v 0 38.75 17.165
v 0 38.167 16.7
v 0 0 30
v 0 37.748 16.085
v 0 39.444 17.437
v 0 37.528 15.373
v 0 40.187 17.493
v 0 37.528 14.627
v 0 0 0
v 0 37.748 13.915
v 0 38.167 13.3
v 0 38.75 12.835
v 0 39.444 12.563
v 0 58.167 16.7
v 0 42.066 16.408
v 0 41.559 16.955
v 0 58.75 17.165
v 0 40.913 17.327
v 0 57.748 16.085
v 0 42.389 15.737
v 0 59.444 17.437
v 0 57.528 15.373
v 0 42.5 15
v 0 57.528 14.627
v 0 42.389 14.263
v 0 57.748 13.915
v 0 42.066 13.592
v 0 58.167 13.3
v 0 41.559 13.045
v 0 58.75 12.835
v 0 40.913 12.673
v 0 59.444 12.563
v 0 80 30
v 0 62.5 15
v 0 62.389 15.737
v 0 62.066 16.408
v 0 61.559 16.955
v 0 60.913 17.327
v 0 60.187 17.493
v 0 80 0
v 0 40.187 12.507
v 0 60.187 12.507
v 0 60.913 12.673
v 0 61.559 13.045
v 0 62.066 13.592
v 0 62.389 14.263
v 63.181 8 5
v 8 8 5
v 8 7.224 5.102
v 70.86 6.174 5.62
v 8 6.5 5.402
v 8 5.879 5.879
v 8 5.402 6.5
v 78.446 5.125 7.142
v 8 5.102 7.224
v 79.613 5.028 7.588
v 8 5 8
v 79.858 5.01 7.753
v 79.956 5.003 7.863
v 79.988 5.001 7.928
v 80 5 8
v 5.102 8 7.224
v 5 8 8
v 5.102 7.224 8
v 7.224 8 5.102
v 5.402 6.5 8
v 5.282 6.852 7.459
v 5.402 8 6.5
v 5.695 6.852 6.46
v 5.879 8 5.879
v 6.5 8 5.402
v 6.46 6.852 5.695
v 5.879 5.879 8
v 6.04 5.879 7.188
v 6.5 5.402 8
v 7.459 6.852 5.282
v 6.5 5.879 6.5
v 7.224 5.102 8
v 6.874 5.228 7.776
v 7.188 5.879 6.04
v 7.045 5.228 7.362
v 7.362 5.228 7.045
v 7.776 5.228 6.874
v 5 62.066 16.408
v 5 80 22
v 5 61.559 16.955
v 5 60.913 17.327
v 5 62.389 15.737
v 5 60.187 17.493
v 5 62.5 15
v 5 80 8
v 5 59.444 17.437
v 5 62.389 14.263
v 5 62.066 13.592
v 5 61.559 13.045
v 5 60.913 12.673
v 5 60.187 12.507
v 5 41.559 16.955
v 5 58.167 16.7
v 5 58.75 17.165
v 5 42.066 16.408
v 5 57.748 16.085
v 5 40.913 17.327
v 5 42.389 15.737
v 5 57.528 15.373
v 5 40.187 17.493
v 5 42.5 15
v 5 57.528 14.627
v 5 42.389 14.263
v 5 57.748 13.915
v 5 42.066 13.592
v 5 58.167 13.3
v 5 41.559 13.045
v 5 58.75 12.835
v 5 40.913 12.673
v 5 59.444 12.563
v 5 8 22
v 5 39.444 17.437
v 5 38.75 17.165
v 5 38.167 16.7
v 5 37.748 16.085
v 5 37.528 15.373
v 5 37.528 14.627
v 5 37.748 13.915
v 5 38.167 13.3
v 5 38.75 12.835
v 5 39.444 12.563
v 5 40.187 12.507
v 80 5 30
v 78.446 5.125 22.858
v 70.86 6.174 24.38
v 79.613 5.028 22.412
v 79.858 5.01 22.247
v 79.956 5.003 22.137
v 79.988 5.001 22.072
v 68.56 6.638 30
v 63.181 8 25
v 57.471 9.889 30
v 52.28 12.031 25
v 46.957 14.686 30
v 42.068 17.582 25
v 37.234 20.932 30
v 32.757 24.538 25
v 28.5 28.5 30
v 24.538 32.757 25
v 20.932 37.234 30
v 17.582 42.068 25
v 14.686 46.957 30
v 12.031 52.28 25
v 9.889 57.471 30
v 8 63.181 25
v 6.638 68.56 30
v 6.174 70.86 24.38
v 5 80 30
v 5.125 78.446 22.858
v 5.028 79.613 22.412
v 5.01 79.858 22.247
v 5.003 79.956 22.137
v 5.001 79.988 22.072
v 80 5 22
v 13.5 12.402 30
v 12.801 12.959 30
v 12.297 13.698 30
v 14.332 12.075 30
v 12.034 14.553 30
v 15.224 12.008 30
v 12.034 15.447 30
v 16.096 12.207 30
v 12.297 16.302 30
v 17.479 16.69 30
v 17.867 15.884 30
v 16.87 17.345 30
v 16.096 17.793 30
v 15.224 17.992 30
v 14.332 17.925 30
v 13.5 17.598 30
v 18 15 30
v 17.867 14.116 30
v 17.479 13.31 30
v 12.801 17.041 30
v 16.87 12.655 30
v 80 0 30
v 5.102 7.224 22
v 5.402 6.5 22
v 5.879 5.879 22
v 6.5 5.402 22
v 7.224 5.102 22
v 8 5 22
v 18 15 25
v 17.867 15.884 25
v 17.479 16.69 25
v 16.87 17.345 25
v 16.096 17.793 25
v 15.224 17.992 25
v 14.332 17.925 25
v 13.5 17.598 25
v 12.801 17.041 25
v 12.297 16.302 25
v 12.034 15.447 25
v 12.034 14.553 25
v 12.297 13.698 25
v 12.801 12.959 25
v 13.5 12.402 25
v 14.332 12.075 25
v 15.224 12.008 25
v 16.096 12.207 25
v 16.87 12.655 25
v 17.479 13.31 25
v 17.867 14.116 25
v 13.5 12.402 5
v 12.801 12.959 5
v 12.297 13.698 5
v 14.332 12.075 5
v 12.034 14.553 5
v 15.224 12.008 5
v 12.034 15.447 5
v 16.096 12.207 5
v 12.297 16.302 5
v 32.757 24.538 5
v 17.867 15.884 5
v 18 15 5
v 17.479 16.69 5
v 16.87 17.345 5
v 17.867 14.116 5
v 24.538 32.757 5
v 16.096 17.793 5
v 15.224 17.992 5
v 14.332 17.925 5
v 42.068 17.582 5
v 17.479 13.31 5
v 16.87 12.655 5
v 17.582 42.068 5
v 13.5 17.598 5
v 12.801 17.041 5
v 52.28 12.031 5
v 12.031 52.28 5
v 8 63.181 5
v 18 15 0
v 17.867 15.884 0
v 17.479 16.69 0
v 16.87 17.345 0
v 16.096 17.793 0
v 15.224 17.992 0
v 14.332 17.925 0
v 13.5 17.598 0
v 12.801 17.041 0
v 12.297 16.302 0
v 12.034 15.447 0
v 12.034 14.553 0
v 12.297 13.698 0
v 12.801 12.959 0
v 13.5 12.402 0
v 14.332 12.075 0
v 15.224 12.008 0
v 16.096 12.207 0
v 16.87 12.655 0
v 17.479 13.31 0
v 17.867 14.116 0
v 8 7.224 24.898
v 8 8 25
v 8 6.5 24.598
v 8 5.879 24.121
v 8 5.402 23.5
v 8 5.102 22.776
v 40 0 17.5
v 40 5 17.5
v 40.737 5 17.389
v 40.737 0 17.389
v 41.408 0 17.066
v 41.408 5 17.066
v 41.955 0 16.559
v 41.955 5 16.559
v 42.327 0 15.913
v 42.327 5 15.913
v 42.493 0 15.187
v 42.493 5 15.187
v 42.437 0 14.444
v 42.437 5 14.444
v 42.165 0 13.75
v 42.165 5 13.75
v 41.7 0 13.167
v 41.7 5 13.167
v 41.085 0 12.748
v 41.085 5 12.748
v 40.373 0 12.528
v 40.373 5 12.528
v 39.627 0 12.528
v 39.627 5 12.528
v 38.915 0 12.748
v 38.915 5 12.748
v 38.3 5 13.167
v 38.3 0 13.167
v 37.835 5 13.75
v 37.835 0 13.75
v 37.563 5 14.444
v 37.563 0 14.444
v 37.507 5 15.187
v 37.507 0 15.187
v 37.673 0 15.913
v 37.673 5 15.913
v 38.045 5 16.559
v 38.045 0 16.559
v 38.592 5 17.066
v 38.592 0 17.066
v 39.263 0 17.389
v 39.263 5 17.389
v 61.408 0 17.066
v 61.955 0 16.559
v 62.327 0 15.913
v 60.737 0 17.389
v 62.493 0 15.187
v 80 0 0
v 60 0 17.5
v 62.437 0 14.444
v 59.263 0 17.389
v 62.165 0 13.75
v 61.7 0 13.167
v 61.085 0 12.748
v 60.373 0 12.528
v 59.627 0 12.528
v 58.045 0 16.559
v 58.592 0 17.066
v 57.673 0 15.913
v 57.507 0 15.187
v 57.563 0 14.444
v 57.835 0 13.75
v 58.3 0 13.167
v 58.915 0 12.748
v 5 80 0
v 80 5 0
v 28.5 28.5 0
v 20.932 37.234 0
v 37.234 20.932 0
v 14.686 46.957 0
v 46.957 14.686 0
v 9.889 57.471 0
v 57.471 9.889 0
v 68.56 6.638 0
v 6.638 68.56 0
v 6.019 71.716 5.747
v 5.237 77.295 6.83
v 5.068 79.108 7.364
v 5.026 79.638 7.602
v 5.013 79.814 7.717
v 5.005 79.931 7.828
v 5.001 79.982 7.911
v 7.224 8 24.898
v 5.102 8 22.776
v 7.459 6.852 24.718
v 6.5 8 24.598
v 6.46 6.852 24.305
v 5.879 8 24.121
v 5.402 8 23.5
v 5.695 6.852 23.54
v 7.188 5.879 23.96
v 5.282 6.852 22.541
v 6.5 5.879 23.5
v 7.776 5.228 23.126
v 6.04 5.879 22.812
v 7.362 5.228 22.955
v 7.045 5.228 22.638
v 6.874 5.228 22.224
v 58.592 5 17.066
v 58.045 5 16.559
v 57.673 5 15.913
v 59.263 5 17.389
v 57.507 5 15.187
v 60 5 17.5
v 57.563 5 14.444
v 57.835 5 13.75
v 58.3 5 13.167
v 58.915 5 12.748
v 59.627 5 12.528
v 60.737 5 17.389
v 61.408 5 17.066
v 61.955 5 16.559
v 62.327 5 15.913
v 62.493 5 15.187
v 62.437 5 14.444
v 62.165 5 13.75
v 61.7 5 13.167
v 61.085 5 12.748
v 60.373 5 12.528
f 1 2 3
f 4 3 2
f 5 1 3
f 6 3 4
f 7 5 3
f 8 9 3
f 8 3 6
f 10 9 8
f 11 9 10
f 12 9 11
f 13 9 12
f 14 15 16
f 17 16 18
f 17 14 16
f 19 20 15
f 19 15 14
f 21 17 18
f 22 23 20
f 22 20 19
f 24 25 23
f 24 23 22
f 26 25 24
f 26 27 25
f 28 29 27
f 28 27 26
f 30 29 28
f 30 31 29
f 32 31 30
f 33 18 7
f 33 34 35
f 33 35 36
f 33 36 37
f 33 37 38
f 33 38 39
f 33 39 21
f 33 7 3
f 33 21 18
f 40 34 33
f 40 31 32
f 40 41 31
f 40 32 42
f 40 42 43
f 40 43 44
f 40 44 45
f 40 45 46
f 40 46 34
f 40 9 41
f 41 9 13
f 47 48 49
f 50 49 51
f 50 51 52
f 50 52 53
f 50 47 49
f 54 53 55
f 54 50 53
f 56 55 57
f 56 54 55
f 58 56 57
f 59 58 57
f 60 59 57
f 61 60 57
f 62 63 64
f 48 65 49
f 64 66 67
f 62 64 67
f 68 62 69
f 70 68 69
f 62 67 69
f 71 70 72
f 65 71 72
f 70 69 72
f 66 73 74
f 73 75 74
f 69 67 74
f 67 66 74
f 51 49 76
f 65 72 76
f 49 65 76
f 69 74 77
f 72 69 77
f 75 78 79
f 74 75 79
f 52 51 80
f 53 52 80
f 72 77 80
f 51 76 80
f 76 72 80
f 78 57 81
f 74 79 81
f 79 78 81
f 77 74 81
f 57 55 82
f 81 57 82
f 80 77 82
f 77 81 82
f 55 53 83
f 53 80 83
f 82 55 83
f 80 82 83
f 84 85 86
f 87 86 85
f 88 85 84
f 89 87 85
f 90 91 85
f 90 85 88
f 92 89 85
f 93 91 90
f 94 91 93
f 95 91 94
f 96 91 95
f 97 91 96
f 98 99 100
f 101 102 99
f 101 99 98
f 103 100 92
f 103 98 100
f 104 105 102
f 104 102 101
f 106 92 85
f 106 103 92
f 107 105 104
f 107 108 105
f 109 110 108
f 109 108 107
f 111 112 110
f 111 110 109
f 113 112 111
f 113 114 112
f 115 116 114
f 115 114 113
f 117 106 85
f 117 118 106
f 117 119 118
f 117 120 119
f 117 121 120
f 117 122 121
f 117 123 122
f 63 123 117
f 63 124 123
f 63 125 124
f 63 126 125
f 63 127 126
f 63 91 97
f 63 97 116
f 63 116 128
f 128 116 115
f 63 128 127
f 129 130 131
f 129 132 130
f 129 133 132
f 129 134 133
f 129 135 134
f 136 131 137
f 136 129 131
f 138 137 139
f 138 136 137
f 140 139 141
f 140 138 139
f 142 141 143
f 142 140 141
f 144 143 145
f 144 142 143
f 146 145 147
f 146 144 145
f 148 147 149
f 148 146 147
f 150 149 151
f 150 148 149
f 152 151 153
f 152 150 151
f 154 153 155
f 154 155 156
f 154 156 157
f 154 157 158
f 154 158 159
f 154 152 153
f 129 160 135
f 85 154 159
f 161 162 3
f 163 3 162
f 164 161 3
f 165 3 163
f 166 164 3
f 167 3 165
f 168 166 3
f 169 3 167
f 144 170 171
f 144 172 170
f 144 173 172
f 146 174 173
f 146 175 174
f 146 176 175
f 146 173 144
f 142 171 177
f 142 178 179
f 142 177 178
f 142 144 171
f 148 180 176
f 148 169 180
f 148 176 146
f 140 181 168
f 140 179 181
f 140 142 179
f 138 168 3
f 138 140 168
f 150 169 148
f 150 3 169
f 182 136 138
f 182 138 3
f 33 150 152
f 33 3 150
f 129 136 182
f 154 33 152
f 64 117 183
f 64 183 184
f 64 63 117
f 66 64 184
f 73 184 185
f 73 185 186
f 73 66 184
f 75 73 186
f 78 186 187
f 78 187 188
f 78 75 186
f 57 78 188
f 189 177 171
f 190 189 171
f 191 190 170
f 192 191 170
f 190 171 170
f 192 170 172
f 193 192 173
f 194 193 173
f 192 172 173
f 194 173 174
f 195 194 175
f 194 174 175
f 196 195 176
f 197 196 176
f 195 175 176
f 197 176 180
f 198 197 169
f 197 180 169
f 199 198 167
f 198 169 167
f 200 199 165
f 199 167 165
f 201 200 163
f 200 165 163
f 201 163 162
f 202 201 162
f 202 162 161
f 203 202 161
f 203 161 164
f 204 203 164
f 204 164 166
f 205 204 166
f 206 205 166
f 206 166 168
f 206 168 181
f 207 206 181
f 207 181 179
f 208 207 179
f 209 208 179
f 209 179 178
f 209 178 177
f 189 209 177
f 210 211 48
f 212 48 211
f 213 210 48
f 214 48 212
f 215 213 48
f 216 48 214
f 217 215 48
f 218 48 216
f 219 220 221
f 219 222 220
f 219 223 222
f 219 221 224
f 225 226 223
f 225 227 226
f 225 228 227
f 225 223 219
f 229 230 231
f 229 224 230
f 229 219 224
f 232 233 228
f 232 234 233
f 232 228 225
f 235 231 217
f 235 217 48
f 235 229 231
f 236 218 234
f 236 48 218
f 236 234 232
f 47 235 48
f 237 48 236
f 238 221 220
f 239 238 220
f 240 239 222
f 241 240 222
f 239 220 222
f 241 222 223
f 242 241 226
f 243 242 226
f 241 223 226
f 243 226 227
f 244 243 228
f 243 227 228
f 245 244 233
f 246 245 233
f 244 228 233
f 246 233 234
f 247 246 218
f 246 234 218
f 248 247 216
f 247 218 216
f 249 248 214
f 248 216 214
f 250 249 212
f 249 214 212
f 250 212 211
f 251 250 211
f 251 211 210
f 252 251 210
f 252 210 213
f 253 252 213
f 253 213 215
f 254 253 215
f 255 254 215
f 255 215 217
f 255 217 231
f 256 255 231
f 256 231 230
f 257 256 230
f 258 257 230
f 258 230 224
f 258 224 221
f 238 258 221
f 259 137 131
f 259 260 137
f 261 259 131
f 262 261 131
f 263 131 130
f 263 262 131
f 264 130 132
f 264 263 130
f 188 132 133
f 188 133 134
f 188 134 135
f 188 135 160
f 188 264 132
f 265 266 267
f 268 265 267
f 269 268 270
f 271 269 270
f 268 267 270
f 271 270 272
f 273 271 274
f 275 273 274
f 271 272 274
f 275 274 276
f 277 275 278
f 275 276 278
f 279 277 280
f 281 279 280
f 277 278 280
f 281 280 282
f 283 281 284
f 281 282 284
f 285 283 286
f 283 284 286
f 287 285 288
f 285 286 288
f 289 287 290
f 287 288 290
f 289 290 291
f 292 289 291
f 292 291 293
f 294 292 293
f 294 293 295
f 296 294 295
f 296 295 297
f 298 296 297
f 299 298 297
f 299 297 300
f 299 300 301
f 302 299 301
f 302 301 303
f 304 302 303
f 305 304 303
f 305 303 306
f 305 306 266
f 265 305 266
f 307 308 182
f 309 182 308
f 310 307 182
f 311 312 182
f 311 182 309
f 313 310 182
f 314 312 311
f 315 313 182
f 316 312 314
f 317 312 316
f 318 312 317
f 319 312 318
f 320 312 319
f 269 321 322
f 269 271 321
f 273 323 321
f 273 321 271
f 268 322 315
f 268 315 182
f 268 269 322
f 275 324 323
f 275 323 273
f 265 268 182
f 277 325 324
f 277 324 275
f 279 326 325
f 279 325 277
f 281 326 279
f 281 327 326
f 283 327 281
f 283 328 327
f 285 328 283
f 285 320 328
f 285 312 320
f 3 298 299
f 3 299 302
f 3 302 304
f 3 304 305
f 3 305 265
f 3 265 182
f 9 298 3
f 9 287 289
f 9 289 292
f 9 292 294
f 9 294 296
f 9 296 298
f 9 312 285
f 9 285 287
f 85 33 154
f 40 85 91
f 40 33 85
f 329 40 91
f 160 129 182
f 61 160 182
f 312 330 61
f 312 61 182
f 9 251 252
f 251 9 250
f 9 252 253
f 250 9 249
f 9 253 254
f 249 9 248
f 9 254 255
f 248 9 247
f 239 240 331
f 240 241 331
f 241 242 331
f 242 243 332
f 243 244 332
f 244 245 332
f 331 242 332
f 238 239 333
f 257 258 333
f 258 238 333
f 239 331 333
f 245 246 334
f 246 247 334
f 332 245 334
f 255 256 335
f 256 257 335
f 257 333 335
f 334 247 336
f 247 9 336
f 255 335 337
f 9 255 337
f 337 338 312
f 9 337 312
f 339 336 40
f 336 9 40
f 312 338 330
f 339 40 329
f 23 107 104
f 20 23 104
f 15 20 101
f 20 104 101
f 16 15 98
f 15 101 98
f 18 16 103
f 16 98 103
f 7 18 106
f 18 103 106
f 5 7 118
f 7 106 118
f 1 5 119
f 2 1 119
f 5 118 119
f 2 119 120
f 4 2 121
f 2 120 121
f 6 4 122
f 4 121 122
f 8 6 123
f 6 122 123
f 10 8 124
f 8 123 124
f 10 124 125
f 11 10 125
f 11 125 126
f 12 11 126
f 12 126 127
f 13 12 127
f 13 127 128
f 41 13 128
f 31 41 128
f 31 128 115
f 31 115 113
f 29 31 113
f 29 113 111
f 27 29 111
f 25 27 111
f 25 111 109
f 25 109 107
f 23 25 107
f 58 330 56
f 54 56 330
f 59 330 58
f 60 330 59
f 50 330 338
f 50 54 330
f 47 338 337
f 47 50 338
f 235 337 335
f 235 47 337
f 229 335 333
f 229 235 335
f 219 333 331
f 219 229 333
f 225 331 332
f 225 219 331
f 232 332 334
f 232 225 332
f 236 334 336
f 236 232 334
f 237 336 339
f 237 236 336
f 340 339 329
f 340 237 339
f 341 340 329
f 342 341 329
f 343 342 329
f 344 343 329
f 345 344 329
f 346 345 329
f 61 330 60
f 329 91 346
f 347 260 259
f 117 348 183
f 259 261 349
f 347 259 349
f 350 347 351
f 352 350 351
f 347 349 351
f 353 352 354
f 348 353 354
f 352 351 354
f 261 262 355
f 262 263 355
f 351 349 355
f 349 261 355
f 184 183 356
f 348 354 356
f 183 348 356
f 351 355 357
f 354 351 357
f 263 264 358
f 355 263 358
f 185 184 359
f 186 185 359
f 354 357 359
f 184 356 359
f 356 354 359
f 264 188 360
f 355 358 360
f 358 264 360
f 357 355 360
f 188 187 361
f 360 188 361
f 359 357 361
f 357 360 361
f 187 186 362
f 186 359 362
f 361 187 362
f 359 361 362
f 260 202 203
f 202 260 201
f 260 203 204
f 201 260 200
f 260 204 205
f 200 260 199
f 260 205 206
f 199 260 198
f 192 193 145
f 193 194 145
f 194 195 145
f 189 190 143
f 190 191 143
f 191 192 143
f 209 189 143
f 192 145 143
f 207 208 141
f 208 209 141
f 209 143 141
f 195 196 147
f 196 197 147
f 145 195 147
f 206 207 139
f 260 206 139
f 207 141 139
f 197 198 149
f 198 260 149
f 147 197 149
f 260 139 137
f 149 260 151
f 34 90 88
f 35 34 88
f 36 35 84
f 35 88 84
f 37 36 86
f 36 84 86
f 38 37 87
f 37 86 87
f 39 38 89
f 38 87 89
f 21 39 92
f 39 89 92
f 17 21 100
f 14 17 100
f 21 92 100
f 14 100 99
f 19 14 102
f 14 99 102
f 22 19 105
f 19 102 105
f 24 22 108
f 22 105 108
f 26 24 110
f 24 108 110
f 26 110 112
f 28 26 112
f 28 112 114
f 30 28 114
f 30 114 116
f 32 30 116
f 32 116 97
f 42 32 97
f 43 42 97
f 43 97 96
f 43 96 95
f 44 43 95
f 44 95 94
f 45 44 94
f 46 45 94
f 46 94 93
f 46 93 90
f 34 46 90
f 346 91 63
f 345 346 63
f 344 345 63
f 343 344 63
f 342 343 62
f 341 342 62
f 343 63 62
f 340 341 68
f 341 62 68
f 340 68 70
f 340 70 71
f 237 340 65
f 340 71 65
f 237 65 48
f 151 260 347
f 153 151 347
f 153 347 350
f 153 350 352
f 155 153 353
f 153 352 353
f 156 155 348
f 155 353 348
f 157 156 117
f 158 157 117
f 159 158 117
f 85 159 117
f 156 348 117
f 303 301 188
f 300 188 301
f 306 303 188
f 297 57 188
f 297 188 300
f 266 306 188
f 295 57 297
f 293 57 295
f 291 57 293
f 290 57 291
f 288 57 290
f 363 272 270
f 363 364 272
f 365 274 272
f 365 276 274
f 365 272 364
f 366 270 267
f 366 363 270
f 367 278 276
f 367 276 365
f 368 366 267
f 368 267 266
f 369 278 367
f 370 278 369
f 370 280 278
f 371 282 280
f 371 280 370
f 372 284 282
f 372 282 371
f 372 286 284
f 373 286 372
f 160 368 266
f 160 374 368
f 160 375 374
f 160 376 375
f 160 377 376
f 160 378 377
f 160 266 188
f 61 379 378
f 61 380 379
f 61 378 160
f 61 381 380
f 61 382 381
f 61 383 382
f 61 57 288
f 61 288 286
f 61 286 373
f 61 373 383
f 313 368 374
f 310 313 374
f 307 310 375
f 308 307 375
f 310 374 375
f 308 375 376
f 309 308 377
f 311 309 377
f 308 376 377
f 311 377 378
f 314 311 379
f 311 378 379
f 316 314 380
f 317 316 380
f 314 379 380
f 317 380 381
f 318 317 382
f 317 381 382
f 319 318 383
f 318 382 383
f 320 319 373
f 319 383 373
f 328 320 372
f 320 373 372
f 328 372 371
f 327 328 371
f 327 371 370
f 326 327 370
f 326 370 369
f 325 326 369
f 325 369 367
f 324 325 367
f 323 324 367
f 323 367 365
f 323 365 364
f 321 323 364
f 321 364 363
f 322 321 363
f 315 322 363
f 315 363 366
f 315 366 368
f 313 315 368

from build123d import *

# Parameters (mm, degrees)
BOSS_EXTRUDE2_DEPTH = 30
SKETCH5_R           = 2.5
CUT_EXTRUDE3_DEPTH  = 6
SKETCH6_R           = 2.5
CUT_EXTRUDE4_DEPTH  = 6
BOSS_EXTRUDE3_DEPTH = 5
BOSS_EXTRUDE4_DEPTH = 5
FILLET1_R           = 3
FILLET2_R           = 3
FILLET3_R           = 3
CUT_EXTRUDE5_DEPTH  = 118.046999107
SKETCH10_R          = 3
CUT_EXTRUDE6_DEPTH  = 118.04699927


with BuildPart() as part:
    # Sketch4 → Boss-Extrude2 (new body)
    with BuildSketch(Plane.XY):
        Polygon((0, 0), (0, 80), (5, 80), (5, 5), (80, 5), (80, 0), align=None)
    extrude(amount=BOSS_EXTRUDE2_DEPTH)

    # Sketch5 → Cut-Extrude3 (cut)
    with BuildSketch(Plane(origin=(0, 5, 0), x_dir=(1, 0, 0), z_dir=(0, 1, 0))):
        with Locations(Location((60, -15, 0), (0, 0, 270))):
            Circle(SKETCH5_R)
        with Locations(Location((40, -15, 0), (0, 0, 270))):
            Circle(SKETCH5_R)
    extrude(amount=-CUT_EXTRUDE3_DEPTH, mode=Mode.SUBTRACT)

    # Sketch6 → Cut-Extrude4 (cut)
    with BuildSketch(Plane(origin=(5, 0, 0), x_dir=(0, 0, -1), z_dir=(1, 0, 0))):
        with Locations(Location((-15, 60, 0), (0, 0, 90))):
            Circle(SKETCH6_R)
        with Locations(Location((-15, 40, 0), (0, 0, 90))):
            Circle(SKETCH6_R)
    extrude(amount=-CUT_EXTRUDE4_DEPTH, mode=Mode.SUBTRACT)

    # Sketch7 → Boss-Extrude3 (add)
    with BuildSketch(Plane(origin=(0, 0, 0), x_dir=(-1, 0, 0), z_dir=(0, 0, -1))):
        Polygon((-5, 80), (-5, 5), (-80, 5), align=None)
    extrude(amount=-BOSS_EXTRUDE3_DEPTH)

    # Sketch8 → Boss-Extrude4 (add)
    with BuildSketch(Plane.XY.offset(30)):
        Polygon((5, 80), (5, 5), (80, 5), align=None)
    extrude(amount=-BOSS_EXTRUDE4_DEPTH)

    # Fillet1
    fillet1_edges = [part.edges().sort_by_distance(p)[0] for p in [
        (5, 42.5, 25),
    ]]
    fillet(fillet1_edges, radius=FILLET1_R)

    # Fillet2
    fillet2_edges = [part.edges().sort_by_distance(p)[0] for p in [
        (5, 42.5, 5),
    ]]
    fillet(fillet2_edges, radius=FILLET2_R)

    # Fillet3
    fillet3_edges = [part.edges().sort_by_distance(p)[0] for p in [
        (44, 5, 5),
        (5, 5, 15),
        (44, 5, 25),
        (5.878679656, 5, 24.121320344),
        (5.878679656, 5, 5.878679656),
    ]]
    fillet(fillet3_edges, radius=FILLET3_R)

    # Sketch9 → Cut-Extrude5 (cut, through all)
    with BuildSketch(Plane.XY.offset(30)):
        with BuildLine():
            Line((5, 80), (80, 5))
            ThreePointArc((80, 5), (28.499618275, 28.499618275), (5, 80))
        make_face()
    extrude(amount=-CUT_EXTRUDE5_DEPTH, mode=Mode.SUBTRACT)

    # Sketch10 → Cut-Extrude6 (cut, through all)
    with BuildSketch(Plane.XY.offset(30)):
        with Locations((15, 15)):
            Circle(SKETCH10_R)
    extrude(amount=-CUT_EXTRUDE6_DEPTH, mode=Mode.SUBTRACT)


solid = part.part
